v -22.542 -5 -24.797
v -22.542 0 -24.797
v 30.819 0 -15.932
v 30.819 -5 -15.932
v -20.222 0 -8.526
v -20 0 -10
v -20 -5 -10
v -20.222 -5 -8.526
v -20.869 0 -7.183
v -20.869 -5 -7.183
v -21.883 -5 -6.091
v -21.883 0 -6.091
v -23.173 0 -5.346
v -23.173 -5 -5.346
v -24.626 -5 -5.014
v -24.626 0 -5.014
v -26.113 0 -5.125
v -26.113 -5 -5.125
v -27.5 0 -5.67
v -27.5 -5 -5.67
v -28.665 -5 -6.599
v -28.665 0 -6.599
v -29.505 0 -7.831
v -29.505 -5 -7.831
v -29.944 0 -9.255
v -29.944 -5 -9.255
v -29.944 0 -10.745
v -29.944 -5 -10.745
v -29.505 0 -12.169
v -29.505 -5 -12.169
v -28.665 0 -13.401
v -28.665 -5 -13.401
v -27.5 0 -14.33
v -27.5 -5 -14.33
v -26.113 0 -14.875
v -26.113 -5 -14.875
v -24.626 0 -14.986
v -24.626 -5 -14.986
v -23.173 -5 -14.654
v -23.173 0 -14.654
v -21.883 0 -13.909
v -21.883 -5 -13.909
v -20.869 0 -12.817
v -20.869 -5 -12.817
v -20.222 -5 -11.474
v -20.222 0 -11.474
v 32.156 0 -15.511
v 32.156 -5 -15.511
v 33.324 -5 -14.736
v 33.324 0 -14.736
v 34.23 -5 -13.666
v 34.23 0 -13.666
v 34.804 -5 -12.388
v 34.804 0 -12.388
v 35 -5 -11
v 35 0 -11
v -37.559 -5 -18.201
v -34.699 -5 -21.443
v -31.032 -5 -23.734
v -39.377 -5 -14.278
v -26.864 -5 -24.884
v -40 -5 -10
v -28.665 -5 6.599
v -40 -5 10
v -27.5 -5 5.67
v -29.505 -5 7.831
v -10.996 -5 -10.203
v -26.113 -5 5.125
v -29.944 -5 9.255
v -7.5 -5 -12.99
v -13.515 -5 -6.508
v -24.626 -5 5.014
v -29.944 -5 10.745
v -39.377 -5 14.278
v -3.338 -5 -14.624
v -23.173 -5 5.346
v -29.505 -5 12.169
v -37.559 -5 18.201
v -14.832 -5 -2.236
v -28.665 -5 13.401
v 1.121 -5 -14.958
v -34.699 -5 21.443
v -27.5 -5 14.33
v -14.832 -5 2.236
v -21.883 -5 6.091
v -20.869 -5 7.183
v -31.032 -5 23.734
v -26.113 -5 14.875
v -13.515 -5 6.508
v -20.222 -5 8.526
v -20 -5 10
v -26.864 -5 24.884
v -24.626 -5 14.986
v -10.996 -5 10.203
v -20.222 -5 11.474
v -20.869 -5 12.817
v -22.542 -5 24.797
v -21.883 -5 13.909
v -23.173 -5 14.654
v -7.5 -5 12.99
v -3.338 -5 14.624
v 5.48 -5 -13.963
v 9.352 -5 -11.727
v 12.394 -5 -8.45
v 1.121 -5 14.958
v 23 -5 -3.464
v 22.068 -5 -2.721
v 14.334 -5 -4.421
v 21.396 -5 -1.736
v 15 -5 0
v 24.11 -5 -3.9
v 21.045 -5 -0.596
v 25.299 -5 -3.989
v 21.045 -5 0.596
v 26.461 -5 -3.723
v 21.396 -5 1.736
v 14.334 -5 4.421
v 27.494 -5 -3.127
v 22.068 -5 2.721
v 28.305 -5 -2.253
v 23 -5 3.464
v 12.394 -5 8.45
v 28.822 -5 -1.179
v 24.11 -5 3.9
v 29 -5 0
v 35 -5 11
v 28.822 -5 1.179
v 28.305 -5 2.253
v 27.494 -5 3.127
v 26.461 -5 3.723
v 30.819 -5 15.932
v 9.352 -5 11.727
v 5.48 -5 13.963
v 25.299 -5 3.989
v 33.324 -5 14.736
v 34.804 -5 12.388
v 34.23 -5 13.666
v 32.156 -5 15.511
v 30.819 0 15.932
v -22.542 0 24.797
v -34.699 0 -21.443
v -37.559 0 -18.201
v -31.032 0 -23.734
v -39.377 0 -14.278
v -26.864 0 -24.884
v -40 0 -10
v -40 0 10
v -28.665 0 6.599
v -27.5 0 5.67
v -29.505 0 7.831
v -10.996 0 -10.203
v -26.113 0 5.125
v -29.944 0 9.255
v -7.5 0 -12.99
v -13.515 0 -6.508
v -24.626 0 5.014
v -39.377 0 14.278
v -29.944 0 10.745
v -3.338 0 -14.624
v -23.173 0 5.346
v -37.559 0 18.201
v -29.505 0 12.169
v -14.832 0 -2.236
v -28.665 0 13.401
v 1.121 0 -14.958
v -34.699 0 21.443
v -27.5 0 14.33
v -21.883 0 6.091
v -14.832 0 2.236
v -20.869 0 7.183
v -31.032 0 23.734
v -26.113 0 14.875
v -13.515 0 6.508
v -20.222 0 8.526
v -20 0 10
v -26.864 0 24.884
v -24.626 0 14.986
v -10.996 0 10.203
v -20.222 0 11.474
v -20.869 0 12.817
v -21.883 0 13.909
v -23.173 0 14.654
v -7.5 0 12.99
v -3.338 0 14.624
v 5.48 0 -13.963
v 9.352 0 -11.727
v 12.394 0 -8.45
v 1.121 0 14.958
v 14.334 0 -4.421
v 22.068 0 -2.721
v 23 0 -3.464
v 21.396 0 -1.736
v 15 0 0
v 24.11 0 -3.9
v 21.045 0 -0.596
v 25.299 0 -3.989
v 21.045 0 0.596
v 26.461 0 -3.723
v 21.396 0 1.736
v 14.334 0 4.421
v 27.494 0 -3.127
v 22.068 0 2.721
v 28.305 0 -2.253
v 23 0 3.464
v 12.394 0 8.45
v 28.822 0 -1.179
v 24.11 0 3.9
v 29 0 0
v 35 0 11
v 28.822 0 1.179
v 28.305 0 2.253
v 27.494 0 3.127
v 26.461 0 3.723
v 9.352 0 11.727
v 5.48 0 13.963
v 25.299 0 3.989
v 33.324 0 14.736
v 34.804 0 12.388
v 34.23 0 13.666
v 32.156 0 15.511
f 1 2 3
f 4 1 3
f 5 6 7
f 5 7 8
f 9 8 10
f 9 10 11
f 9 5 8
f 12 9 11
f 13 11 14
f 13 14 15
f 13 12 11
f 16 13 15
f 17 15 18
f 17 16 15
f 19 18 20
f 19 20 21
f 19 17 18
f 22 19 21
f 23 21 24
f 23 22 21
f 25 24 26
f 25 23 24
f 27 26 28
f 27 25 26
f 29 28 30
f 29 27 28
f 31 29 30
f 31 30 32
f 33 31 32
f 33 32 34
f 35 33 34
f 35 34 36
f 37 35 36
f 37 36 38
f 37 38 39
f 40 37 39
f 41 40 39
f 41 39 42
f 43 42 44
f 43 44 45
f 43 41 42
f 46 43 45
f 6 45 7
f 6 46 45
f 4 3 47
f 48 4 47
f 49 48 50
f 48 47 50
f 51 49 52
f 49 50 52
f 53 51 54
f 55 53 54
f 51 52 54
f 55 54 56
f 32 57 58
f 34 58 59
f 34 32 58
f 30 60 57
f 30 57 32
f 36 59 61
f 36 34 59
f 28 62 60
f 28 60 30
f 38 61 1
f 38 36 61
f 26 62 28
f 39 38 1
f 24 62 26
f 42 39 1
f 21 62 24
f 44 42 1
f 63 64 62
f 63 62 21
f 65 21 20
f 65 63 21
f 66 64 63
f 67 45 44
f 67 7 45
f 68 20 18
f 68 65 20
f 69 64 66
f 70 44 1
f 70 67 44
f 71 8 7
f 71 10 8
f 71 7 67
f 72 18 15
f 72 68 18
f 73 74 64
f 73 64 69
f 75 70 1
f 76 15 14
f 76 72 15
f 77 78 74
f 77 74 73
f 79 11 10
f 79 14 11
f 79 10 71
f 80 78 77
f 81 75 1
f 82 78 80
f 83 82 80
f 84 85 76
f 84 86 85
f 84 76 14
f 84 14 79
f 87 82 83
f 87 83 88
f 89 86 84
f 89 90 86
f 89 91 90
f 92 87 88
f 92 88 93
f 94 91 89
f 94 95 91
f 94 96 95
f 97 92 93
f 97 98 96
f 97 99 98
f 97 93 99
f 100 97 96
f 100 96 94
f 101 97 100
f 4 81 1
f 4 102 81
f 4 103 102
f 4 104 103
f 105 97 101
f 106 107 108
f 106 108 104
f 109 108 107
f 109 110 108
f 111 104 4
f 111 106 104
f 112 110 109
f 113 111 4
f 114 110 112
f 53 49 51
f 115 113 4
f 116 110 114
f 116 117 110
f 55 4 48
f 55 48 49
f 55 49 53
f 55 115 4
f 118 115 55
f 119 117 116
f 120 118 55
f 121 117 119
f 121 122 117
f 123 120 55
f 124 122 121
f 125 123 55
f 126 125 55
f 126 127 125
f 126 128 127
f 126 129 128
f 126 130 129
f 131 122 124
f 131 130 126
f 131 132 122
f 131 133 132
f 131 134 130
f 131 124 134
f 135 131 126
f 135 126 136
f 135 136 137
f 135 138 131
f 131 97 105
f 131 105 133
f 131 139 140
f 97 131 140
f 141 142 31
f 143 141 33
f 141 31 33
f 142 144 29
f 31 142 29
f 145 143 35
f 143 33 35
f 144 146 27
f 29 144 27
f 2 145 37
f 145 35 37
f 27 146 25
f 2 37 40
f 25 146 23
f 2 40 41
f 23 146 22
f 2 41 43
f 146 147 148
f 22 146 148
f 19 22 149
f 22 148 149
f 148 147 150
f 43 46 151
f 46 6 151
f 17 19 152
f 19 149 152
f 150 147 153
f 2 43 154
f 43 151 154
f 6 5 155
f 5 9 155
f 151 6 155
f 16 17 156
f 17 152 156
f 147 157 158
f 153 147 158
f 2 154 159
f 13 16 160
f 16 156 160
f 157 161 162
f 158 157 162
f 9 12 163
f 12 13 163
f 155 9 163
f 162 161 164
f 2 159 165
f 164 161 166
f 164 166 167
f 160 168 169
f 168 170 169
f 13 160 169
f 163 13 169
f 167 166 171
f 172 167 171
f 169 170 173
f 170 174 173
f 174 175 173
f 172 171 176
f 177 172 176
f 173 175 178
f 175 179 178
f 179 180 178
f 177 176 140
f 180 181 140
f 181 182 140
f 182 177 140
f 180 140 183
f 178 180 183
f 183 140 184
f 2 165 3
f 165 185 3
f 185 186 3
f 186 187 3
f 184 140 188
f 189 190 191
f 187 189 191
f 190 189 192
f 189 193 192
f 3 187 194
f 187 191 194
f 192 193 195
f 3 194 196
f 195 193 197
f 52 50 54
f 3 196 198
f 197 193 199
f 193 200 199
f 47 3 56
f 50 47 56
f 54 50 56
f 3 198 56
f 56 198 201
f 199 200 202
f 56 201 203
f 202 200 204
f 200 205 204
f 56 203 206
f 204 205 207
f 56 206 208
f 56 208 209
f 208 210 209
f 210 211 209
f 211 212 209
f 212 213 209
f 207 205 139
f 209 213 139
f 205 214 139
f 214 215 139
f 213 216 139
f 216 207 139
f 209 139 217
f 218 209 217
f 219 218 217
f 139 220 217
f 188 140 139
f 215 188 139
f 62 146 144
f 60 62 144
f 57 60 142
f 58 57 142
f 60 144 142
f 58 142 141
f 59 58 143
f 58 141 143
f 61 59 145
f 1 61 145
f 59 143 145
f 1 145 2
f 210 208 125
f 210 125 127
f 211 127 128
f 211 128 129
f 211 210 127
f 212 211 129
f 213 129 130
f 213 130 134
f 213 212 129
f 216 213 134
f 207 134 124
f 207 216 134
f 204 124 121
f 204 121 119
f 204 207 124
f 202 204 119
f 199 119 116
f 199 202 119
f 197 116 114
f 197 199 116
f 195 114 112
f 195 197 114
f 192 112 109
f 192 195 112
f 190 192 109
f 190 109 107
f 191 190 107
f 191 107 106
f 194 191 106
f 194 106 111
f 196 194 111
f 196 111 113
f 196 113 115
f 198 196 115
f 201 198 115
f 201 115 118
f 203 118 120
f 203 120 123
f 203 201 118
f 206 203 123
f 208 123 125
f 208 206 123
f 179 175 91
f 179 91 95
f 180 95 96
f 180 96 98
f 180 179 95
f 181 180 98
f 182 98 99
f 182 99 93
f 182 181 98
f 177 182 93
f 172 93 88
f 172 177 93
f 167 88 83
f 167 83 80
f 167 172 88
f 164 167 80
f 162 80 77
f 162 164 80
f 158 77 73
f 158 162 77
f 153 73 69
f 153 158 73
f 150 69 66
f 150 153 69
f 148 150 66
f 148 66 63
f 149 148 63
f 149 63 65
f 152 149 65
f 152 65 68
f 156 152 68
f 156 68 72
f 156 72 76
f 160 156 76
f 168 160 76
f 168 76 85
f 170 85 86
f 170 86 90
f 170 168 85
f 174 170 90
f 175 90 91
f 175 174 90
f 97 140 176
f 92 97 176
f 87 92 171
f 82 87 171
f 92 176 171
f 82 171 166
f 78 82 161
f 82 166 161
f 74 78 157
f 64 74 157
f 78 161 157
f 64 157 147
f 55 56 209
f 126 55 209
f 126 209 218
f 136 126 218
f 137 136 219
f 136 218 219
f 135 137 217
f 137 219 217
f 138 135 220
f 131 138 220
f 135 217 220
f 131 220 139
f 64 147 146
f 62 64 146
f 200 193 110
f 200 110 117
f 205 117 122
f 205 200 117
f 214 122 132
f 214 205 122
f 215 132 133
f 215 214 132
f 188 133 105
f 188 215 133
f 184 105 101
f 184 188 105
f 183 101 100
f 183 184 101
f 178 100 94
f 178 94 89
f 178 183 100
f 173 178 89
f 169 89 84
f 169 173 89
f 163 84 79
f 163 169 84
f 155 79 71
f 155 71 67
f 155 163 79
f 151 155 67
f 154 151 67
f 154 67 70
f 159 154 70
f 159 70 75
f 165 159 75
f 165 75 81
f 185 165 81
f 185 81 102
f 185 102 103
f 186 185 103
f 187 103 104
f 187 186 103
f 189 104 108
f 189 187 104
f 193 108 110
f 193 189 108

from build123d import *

# Parameters (mm, degrees)
F0_R     = 5
F0_R_2   = 15
F0_R_3   = 4
F1_DEPTH = 5


with BuildPart() as f1:
    # F0 (on Front) → F1 (new body)
    with BuildSketch(Plane.XZ):
        with BuildLine():
            Line((30.819411, 15.9324), (-22.541767, 24.797199))
            ThreePointArc((-22.541767, 24.797199), (-34.698621, 21.44276), (-40, 10))
            Line((-40, 10), (-40, -10))
            ThreePointArc((-40, -10), (-34.698621, -21.44276), (-22.541767, -24.797199))
            Line((-22.541767, -24.797199), (30.819411, -15.9324))
            ThreePointArc((30.819411, -15.9324), (33.814253, -14.232874), (35, -11))
            Line((35, -11), (35, 11))
            ThreePointArc((35, 11), (33.814253, 14.232874), (30.819411, 15.9324))
        make_face()
        with Locations((-25, -10)):
            Circle(F0_R, mode=Mode.SUBTRACT)
        Circle(F0_R_2, mode=Mode.SUBTRACT)
        with Locations((25, 0)):
            Circle(F0_R_3, mode=Mode.SUBTRACT)
        with Locations((-25, 10)):
            Circle(F0_R, mode=Mode.SUBTRACT)
    extrude(amount=F1_DEPTH)


solid = f1.part
